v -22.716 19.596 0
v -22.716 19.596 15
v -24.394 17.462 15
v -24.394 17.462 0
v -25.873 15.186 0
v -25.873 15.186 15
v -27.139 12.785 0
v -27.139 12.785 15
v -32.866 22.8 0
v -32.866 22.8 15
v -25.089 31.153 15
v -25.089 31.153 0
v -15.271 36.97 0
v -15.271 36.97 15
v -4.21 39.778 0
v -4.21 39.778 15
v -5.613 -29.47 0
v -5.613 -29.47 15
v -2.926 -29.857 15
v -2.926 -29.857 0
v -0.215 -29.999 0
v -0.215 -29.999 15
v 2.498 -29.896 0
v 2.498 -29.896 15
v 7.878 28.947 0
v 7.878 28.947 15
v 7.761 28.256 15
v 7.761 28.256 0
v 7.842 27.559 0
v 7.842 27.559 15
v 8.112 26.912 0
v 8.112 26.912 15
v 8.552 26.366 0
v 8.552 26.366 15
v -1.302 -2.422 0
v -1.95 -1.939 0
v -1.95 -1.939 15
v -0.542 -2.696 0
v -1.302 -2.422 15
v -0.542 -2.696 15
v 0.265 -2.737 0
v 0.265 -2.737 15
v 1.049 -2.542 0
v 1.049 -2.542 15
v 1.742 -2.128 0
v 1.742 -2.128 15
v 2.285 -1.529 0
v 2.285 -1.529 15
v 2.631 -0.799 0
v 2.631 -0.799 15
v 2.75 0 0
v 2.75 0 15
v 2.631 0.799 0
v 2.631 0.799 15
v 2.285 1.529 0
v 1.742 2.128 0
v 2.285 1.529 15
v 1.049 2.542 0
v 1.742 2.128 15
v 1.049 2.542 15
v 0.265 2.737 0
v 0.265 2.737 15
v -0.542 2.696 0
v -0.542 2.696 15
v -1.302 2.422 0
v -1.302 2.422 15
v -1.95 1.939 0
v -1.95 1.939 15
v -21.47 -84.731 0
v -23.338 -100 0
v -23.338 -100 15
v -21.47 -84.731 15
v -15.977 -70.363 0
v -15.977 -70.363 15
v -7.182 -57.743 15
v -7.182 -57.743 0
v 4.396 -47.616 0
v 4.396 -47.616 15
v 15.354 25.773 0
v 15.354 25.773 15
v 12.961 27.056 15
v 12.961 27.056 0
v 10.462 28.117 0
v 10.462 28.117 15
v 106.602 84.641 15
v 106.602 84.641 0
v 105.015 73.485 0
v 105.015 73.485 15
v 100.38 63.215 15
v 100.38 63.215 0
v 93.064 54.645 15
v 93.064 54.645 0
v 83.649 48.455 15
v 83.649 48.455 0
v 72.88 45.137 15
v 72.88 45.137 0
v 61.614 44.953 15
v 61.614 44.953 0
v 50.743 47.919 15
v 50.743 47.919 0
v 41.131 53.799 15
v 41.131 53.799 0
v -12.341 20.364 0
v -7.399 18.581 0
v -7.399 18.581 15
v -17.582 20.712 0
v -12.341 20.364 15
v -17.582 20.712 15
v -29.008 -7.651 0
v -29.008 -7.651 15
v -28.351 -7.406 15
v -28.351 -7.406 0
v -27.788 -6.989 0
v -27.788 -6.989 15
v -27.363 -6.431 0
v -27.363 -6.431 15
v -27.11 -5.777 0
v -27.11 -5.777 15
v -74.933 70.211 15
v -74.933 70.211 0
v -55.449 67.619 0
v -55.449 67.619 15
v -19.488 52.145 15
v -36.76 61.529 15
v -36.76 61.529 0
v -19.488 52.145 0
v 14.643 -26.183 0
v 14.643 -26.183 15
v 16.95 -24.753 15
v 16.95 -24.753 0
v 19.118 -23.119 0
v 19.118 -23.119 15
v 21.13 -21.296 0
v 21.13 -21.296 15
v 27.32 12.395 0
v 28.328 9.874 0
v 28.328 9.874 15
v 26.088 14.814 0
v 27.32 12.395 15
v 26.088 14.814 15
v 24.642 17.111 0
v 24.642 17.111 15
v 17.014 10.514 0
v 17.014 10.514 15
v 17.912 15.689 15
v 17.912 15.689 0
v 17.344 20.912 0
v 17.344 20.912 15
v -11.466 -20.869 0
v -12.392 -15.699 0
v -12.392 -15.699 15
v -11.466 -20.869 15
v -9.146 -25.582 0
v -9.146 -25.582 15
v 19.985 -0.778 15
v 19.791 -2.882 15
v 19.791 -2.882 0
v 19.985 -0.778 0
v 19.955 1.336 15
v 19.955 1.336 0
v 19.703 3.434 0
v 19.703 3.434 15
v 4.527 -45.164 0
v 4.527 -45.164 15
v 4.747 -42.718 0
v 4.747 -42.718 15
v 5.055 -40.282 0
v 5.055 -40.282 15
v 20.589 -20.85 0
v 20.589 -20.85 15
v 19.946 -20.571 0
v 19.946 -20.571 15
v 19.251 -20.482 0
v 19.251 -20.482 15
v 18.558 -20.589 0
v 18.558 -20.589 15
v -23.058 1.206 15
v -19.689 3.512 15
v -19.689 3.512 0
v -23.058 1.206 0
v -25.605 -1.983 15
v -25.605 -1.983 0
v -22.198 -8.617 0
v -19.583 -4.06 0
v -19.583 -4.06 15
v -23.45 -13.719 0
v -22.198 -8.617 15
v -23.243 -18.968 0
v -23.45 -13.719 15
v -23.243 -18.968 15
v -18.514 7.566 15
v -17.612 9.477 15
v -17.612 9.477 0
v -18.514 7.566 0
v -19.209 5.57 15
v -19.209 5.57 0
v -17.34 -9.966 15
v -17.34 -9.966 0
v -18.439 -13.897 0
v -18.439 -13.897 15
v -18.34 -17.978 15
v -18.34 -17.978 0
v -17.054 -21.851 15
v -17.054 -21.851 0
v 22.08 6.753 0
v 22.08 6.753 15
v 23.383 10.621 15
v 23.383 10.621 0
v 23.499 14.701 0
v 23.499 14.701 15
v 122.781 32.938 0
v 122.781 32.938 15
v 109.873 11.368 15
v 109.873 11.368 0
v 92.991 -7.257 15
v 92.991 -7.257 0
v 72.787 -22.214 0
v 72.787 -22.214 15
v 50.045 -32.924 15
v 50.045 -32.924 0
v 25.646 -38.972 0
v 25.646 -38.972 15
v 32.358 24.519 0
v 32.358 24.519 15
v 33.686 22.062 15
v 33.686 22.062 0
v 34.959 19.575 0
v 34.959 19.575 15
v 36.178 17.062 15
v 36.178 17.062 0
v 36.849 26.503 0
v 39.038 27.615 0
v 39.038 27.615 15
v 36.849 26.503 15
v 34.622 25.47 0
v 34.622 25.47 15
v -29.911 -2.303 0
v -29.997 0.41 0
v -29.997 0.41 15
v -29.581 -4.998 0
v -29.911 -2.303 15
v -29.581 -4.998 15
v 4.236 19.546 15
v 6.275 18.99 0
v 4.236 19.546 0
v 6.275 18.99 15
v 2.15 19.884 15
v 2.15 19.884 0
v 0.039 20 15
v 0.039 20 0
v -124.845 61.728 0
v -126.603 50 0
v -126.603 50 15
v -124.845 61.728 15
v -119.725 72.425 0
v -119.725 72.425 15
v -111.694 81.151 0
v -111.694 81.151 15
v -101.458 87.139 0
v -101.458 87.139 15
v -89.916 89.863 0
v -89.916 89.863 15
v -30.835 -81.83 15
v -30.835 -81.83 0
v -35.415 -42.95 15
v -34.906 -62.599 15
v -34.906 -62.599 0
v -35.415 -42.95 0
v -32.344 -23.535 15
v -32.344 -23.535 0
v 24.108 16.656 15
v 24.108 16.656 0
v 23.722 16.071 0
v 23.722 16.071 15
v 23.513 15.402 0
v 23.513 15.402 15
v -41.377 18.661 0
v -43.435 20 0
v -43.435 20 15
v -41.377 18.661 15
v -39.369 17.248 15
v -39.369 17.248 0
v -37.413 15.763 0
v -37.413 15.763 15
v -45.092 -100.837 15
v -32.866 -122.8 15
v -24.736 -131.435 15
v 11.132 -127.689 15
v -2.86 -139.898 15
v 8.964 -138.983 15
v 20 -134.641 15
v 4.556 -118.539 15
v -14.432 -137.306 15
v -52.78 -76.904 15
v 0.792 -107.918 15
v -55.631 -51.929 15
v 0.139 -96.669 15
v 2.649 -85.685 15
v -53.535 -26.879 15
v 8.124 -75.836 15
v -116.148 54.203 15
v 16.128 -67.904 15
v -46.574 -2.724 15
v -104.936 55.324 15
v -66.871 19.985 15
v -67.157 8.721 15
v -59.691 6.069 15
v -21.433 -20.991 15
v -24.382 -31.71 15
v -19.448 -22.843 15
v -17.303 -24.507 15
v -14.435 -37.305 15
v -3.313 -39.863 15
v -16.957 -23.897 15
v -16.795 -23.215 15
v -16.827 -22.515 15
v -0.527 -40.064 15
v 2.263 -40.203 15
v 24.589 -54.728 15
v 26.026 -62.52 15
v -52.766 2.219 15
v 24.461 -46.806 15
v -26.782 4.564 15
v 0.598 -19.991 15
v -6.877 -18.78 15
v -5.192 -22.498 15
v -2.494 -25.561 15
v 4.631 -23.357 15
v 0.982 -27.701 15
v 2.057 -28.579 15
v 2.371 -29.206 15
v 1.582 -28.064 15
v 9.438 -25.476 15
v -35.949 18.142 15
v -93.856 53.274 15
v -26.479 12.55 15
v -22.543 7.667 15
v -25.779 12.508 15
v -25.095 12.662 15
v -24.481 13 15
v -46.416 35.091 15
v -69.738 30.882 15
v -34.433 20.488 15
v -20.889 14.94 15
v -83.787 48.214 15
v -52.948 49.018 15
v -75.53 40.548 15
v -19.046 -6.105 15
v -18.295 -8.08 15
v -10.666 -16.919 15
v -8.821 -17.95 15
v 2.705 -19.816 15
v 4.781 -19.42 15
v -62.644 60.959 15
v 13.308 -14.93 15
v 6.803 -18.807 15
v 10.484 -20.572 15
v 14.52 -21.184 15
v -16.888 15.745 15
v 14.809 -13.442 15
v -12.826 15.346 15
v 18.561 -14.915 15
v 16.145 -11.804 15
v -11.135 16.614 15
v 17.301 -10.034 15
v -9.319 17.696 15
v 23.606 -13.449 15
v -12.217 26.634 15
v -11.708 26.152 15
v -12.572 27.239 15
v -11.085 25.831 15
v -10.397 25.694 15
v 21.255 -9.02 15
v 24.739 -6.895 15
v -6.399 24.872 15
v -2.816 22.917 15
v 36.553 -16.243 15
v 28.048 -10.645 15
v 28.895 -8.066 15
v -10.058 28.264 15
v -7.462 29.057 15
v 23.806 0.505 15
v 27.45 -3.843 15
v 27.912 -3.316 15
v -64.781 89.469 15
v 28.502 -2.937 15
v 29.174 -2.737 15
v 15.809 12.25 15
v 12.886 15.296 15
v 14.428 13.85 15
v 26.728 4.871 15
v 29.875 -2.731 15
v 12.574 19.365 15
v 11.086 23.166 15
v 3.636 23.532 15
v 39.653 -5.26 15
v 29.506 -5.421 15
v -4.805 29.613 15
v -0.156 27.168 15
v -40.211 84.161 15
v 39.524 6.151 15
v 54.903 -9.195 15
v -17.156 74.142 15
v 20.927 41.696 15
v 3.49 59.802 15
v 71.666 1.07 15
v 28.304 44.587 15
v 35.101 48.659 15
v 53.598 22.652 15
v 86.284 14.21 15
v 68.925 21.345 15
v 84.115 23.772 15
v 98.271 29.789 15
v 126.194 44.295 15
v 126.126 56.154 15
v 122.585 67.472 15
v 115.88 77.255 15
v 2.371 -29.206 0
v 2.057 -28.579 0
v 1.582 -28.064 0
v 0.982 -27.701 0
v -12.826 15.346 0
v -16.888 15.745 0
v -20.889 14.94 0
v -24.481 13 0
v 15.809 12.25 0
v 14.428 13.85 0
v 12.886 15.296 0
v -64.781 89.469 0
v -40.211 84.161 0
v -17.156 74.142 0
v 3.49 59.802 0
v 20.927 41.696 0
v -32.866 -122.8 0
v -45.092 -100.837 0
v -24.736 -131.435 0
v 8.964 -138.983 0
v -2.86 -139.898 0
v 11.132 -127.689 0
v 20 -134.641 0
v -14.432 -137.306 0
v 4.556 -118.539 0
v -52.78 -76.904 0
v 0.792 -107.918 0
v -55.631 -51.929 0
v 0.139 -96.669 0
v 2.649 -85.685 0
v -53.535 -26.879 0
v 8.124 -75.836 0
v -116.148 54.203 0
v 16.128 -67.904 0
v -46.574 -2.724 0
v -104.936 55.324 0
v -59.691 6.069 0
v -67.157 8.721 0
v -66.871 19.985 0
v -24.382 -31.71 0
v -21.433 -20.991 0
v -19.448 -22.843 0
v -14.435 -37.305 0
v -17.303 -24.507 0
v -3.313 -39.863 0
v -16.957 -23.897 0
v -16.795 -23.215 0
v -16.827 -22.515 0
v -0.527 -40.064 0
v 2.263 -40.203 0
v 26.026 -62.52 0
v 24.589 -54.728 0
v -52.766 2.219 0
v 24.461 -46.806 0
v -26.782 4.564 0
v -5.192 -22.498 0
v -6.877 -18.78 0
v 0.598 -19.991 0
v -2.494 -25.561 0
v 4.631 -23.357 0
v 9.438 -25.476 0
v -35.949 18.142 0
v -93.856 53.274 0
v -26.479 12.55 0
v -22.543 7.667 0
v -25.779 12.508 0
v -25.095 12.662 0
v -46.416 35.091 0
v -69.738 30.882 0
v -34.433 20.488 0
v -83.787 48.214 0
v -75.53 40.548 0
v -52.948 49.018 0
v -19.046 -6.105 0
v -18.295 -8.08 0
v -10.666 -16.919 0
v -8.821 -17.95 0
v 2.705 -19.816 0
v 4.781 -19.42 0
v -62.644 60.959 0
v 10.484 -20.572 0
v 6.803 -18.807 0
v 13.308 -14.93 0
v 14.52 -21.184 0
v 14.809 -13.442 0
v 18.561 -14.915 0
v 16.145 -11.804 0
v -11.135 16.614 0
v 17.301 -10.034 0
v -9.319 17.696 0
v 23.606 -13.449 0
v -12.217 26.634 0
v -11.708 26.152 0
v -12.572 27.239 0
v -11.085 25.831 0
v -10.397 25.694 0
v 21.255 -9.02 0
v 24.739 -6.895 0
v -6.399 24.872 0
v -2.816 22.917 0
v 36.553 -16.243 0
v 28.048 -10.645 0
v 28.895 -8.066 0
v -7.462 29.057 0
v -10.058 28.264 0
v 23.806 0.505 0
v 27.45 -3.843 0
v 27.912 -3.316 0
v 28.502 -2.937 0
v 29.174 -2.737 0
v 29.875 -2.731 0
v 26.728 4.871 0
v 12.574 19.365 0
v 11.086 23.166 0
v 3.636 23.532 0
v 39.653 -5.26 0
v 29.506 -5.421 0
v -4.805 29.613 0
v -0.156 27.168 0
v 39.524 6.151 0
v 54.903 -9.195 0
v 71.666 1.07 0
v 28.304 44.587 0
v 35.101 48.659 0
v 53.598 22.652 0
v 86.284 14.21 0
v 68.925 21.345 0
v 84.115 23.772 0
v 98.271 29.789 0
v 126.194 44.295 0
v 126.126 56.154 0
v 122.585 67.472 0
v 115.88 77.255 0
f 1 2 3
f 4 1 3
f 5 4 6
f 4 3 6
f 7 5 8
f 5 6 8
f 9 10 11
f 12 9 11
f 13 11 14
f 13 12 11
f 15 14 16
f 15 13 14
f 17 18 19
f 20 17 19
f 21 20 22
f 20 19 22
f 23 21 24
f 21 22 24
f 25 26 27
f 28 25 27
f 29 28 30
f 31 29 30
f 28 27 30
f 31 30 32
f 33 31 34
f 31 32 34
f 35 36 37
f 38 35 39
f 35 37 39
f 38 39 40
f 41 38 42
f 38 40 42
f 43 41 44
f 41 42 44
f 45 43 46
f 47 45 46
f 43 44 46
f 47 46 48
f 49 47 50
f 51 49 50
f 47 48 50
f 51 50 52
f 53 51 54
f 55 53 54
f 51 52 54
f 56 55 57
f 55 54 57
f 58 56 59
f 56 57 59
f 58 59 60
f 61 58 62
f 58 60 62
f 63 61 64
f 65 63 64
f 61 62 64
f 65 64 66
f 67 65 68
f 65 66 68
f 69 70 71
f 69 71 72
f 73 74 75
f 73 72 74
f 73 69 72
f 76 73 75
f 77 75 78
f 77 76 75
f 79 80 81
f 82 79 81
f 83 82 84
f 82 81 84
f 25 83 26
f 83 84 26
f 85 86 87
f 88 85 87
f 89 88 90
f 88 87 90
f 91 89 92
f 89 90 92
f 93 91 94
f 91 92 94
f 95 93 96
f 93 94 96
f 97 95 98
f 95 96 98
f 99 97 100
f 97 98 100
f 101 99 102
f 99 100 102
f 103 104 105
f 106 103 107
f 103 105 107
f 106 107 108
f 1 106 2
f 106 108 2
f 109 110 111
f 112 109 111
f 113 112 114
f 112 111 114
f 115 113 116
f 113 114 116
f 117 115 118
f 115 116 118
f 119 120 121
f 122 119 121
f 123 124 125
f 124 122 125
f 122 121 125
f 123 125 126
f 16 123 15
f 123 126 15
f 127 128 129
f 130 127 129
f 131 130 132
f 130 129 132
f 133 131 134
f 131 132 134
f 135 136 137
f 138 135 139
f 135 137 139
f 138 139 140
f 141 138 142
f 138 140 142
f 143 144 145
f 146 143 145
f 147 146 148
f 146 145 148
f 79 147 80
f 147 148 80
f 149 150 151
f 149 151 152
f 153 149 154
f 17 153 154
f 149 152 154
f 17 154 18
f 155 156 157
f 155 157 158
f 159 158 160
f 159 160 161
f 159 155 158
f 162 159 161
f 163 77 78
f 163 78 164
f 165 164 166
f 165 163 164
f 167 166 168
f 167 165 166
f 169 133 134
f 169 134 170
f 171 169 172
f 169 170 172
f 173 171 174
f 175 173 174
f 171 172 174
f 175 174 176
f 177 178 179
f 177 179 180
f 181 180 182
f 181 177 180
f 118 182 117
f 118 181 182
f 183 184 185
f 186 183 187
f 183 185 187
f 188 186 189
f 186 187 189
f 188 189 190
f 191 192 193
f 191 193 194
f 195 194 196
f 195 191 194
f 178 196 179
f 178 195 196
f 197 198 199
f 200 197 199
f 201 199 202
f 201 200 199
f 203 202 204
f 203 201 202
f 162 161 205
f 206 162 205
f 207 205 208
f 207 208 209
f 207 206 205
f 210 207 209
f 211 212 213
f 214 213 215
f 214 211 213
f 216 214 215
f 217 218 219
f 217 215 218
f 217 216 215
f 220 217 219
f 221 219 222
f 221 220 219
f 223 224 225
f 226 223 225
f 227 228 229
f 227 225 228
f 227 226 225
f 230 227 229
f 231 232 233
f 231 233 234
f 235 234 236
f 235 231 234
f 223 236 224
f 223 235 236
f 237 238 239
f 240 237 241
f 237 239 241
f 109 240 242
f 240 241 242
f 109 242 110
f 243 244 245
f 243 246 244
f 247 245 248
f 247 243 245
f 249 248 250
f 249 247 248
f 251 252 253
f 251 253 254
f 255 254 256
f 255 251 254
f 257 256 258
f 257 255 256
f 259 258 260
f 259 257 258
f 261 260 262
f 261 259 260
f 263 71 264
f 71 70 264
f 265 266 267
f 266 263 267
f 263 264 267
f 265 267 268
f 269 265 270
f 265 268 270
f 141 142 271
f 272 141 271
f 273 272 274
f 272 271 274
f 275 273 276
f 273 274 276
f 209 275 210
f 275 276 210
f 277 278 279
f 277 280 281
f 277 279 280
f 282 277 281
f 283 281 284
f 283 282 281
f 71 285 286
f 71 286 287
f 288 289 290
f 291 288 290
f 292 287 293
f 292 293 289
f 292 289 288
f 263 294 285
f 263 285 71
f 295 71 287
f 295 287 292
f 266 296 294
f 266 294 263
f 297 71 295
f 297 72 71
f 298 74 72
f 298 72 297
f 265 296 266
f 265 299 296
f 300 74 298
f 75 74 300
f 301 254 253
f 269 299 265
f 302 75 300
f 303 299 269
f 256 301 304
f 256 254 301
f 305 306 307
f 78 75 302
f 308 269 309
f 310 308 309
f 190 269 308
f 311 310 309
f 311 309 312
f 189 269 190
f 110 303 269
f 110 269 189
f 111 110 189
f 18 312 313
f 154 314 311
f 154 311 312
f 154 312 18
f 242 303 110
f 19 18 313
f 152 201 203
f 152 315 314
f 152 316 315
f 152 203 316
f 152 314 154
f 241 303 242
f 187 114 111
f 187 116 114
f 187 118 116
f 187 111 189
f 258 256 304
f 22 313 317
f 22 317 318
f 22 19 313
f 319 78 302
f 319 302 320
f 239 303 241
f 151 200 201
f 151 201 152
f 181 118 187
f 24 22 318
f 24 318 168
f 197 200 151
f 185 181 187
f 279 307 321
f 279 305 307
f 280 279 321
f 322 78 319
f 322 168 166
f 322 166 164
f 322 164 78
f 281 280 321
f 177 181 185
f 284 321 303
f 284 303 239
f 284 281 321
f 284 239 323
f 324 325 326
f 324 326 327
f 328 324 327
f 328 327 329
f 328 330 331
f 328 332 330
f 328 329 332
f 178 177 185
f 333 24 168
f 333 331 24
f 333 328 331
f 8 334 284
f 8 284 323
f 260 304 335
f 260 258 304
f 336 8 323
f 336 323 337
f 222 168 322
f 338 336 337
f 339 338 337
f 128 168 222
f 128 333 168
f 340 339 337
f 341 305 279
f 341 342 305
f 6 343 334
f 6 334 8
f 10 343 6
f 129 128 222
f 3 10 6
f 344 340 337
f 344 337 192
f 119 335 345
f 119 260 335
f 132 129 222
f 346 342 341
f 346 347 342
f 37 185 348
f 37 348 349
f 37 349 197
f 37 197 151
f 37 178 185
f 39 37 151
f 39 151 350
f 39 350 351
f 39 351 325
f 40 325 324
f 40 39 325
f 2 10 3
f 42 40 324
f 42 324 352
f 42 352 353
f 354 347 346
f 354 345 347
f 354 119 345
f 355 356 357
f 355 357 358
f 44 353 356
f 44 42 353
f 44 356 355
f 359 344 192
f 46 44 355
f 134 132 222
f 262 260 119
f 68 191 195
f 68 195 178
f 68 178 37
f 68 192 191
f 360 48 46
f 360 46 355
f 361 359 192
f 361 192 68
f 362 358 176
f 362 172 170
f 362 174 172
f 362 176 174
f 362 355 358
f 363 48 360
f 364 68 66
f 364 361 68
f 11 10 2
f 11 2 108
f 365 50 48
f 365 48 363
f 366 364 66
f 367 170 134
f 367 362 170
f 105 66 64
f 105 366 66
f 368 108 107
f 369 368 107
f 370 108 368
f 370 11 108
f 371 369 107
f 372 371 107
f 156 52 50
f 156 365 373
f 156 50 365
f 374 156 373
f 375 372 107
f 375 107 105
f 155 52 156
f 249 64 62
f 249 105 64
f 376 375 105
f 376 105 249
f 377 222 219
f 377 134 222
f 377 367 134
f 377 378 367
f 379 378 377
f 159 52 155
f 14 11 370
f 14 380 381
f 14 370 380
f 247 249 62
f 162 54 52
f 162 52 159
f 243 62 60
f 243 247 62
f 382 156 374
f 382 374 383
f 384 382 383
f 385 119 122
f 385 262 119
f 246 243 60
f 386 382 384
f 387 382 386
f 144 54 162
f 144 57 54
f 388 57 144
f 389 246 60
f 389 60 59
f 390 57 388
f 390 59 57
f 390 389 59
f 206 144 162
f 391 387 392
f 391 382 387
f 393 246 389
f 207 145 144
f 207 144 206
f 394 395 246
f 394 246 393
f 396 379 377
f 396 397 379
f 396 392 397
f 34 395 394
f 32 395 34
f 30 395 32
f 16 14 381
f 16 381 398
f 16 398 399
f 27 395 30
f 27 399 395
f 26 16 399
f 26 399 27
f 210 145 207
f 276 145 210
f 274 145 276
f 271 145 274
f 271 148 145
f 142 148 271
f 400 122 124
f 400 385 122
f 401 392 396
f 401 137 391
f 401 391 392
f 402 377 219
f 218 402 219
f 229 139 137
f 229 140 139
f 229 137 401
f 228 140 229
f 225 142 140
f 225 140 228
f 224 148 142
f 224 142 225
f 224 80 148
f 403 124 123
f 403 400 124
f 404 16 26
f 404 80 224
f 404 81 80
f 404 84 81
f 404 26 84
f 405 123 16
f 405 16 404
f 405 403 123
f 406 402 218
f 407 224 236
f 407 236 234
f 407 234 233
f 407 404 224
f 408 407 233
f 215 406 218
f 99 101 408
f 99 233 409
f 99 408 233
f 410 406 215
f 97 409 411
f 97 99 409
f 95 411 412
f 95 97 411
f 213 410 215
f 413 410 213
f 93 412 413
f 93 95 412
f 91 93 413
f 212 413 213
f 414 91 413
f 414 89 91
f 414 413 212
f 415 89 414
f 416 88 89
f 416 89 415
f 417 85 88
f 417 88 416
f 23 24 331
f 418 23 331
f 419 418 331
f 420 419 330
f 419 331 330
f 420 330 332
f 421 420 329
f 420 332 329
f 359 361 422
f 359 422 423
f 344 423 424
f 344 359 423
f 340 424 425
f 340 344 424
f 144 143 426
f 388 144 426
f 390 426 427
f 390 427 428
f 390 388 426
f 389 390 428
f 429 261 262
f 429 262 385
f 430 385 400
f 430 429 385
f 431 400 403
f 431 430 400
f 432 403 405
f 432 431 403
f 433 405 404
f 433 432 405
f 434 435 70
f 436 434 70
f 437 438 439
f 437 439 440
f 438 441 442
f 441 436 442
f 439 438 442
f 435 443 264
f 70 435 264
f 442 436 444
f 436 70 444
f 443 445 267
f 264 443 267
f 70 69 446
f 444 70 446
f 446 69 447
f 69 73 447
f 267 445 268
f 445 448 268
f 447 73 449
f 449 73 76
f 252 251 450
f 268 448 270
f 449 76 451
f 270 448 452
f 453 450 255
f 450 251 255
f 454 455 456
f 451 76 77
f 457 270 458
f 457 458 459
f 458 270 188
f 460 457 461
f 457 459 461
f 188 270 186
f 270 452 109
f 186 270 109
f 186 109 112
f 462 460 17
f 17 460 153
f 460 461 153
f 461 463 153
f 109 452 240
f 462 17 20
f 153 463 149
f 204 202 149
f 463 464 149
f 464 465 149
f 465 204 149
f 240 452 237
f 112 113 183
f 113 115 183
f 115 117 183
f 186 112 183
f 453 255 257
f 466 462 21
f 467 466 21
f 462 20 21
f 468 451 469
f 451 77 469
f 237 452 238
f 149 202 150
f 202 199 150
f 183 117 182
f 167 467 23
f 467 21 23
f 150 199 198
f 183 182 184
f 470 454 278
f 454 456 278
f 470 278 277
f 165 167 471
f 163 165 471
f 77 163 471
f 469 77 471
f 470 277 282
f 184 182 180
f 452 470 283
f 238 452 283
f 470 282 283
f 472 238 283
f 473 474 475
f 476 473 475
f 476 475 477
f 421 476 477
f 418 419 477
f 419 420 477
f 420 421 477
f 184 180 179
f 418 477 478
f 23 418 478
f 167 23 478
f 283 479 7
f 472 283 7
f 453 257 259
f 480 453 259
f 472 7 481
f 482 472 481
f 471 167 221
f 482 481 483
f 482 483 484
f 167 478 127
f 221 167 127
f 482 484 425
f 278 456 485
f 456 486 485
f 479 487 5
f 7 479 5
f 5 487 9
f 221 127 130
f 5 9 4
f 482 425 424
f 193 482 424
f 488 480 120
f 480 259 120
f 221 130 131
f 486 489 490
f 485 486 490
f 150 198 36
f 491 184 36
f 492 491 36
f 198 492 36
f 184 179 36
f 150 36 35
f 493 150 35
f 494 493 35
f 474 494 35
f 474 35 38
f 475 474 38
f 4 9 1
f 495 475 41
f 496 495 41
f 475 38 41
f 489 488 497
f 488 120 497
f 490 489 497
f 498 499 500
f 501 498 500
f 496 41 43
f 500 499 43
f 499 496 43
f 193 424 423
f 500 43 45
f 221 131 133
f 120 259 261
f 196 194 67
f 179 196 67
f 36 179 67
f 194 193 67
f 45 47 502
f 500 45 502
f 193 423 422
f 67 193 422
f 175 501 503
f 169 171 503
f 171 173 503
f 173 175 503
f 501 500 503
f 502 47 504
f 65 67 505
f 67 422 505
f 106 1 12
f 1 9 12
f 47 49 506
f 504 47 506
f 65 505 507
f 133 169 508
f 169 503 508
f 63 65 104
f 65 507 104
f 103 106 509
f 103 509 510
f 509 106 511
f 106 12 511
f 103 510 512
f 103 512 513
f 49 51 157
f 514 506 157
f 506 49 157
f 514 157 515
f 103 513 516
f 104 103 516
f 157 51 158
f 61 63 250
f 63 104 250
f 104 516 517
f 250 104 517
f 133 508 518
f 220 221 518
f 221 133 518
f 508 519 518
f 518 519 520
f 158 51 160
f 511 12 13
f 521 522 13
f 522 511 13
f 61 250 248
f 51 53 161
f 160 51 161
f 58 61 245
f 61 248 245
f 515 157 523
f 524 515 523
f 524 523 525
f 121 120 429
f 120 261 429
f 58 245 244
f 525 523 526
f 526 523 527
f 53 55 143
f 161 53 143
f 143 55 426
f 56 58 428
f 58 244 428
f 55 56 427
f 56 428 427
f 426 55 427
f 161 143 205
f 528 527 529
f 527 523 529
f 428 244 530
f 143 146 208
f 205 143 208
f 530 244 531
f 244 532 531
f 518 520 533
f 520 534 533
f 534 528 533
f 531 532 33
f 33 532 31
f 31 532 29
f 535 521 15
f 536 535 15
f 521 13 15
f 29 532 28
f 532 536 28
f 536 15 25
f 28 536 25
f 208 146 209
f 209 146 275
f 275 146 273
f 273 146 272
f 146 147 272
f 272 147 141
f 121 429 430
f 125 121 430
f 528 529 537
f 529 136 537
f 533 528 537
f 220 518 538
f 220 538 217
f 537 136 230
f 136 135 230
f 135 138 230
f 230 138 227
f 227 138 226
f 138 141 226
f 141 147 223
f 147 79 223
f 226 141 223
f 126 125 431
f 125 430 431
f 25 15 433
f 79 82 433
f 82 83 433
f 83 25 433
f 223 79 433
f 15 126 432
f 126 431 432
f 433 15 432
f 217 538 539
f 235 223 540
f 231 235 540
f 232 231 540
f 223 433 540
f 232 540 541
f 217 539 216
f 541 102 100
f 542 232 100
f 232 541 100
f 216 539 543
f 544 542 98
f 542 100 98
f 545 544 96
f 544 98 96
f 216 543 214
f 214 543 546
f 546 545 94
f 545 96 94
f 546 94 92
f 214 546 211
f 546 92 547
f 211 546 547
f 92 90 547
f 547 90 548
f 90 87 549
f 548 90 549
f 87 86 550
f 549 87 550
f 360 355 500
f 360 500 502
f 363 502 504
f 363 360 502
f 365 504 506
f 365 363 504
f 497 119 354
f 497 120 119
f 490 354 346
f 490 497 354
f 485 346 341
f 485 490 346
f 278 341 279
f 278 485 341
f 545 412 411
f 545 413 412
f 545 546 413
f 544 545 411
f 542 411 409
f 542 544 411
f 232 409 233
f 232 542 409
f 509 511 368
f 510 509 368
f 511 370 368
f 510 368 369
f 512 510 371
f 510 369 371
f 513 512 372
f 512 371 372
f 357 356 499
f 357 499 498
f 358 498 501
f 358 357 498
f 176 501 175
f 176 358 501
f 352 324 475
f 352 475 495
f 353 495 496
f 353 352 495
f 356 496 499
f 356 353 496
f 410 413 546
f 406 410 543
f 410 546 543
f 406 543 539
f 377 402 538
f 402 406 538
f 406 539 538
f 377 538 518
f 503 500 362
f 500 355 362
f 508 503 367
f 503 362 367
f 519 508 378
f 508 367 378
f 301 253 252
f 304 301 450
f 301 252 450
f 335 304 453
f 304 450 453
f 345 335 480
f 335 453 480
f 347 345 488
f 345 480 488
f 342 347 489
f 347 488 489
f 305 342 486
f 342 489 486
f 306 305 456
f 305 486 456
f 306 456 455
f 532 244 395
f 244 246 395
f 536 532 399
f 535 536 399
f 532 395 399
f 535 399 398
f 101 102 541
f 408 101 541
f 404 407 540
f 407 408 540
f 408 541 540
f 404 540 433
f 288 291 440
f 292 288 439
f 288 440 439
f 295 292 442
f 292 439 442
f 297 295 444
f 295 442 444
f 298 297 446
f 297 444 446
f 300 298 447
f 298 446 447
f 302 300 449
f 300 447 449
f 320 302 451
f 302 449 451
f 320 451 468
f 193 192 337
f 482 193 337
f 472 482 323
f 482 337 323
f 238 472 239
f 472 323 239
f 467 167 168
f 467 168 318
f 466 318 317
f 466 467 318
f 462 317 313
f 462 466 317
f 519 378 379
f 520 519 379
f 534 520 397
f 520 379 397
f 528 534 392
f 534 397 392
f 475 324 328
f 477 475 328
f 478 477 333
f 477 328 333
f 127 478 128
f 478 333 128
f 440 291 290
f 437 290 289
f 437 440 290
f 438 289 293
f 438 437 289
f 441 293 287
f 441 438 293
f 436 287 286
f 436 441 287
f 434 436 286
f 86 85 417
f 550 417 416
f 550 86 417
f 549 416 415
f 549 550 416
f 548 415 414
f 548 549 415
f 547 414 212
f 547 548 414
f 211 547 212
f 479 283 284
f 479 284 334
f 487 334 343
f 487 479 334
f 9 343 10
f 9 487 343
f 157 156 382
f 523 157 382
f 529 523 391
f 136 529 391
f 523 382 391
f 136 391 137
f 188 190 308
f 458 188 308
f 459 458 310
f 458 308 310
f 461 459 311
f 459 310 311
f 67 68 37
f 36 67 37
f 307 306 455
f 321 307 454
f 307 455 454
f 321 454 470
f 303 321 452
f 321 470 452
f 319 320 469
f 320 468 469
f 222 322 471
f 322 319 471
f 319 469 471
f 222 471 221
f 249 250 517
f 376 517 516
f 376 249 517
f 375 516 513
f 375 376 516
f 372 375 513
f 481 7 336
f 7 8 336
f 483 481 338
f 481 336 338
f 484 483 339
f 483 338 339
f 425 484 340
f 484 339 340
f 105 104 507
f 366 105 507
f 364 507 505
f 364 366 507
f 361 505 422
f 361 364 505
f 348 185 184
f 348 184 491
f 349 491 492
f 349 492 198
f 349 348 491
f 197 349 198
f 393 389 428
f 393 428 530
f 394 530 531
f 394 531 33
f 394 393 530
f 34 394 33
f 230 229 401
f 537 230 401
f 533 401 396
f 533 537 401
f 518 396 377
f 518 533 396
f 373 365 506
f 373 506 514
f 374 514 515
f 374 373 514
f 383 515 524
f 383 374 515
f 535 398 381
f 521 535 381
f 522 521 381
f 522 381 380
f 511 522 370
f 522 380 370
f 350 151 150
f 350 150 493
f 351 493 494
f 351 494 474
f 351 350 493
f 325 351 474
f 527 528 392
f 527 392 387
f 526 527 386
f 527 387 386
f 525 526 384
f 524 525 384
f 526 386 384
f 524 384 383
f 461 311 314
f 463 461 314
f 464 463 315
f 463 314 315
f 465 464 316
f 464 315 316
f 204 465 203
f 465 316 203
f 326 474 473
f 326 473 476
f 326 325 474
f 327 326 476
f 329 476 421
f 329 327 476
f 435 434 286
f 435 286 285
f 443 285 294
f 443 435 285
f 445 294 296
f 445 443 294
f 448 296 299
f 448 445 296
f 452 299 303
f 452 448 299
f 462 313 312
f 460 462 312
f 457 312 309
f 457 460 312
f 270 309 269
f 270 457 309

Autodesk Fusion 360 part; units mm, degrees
sketch "스케치1" plane through (0, 0, 0) normal (0, 0, 1) x (1, 0, 0)
  arc A0 (32.8655, -22.8005) -> (32.8655, -77.1995) centre (72.0719, -50) ccw
  arc A1 (32.8655, -22.8005) -> (-32.8655, 22.8005) centre (0, 0) ccw
  arc A2 (-32.8655, 22.8005) -> (-32.8655, -122.8005) centre (72.0719, -50) ccw
  arc A3 (-32.8655, -122.8005) -> (32.8655, -77.1995) centre (0, -100) ccw
  arc A4 (0, 0) -> (0, -100) centre (72.0719, -50) ccw construction
  arc A5 (16.4327, -11.4002) -> (16.4327, -88.5998) centre (72.0719, -50) ccw
  arc A6 (16.4327, -11.4002) -> (-16.4327, 11.4002) centre (0, 0) ccw
  arc A7 (-16.4327, 11.4002) -> (-16.4327, -111.4002) centre (72.0719, -50) ccw
  arc A8 (-16.4327, -111.4002) -> (16.4327, -88.5998) centre (0, -100) ccw
  arc A9 (0, 0) -> (0, -100) centre (72.0719, -50) ccw construction
  circle A10 centre (40, -100) radius 40
  circle A11 centre (40, -100) radius 63.3381
  arc A12 (1.6565, 19.9313) -> (-1.6565, -19.9313) centre (0, 0) ccw
  arc A13 (0, 0) -> (86.6025, 50) centre (7.2653, 87.4161) ccw construction
  arc A14 (3.3131, 39.8626) -> (50.424, 67.0621) centre (7.2653, 87.4161) ccw
  arc A15 (3.3131, 39.8626) -> (-3.3131, -39.8626) centre (0, 0) ccw
  arc A16 (104.6918, 41.469) -> (68.5133, 58.531) centre (86.6025, 50) ccw
  arc A17 (122.7811, 32.9379) -> (50.424, 67.0621) centre (86.6025, 50) ccw
  arc A18 (1.6565, 19.9313) -> (68.5133, 58.531) centre (7.2653, 87.4161) ccw
  arc A19 (-1.6565, -19.9313) -> (104.6918, 41.469) centre (7.2653, 87.4161) ccw
  circle A20 centre (66.6025, 84.641) radius 63.3381
  arc A21 (0, 0) -> (86.6025, 50) centre (7.2653, 87.4161) ccw construction
  arc A22 (-3.3131, -39.8626) -> (122.7811, 32.9379) centre (7.2653, 87.4161) ccw
  circle A23 centre (66.6025, 84.641) radius 40
  arc A24 (-18.0893, -8.531) -> (18.0893, 8.531) centre (0, 0) ccw
  arc A25 (0, 0) -> (-86.6025, 50) centre (-79.3372, -37.4161) ccw construction
  arc A26 (-36.1785, -17.0621) -> (-83.2895, 10.1374) centre (-79.3372, -37.4161) ccw
  arc A27 (-36.1785, -17.0621) -> (36.1785, 17.0621) centre (0, 0) ccw
  arc A28 (-88.2591, 69.9313) -> (-84.946, 30.0687) centre (-86.6025, 50) ccw
  arc A29 (-89.9156, 89.8626) -> (-83.2895, 10.1374) centre (-86.6025, 50) ccw
  arc A30 (-18.0893, -8.531) -> (-84.946, 30.0687) centre (-79.3372, -37.4161) ccw
  arc A31 (18.0893, 8.531) -> (-88.2591, 69.9313) centre (-79.3372, -37.4161) ccw
  circle A32 centre (-106.6025, 15.359) radius 63.3381
  arc A33 (0, 0) -> (-86.6025, 50) centre (-79.3372, -37.4161) ccw construction
  arc A34 (36.1785, 17.0621) -> (-89.9156, 89.8626) centre (-79.3372, -37.4161) ccw
  circle A35 centre (-106.6025, 15.359) radius 40
  dimension "d1" = 100
  dimension "d2" = 80
  dimension "d3" = 40
  dimension "d5" = 360
extrude "돌출1" add sketch "스케치1" along normal blind 30 contours A0 A1 A11 A17 A19 A20 A22 A27 | A1 A5 A19 A27 | A0 A5 A11 A22 A27 | A0 A11 A22 | A0 A11 A22 | A1 A5 A6 A18 A19 A24 A27 A31 | A5 A7 A12 A15 A19 A24 A27 A30 | A5 A22 A27 | A0 A5 A10 A11 A22 | A5 A11 A22 | A1 A18 A34 | A5 A19 A24 | A16 A18 A19 A20 A23 | A16 A17 A19 A20 A23 | A5 A7 A8 A10 A11 | A1 A15 A18 A31 | A1 A14 A18 A20 A34 | A18 A20 A34 | A6 A12 A24 | A14 A18 A20 A23 A34 | A7 A15 A27 A30 | A2 A3 A7 A11 A15 A26 A27 A32 | A3 A7 A8 A10 A11 | A1 A14 A15 A20 A29 A31 A32 A34 | A6 A18 A31 | A1 A6 A7 A12 A15 A18 A30 A31 | A14 A20 A34 | A7 A12 A30 | A2 A15 A26 A30 A32 | A14 A20 A34 | A2 A15 A30 | A2 A26 A32 | A2 A26 A32 | A28 A30 A31 A32 A35 | A28 A29 A31 A32 A35 | A2 A30 A32 | A2 A26 A30 A32 A35
sketch "스케치2" plane through (0, 0, 30) normal (0, 0, 1) x (-1, 0, 0)
  arc A0 (-36.5535, 16.2433) -> (-98.2716, -29.7887) centre (-7.2653, -87.4161) ccw
  arc A1 (-36.5535, 16.2433) -> (-36.1785, -17.0621) centre (0, 0) ccw
  arc A2 (-36.1785, -17.0621) -> (-32.3578, -24.5192) centre (79.3372, 37.4161) ccw
  arc A3 (-32.3578, -24.5192) -> (-39.0384, -27.6153) centre (-7.2653, -87.4161) ccw
  arc A4 (-39.0384, -27.6153) -> (-98.2716, -29.7887) centre (-66.6025, -84.641) ccw
  arc A5 (32.3438, 23.5346) -> (3.3131, 39.8626) centre (0, 0) ccw
  arc A6 (3.3131, 39.8626) -> (-5.0553, 40.2823) centre (-7.2653, -87.4161) ccw
  arc A7 (-5.0553, 40.2823) -> (-4.3964, 47.6159) centre (-72.0719, 50) ccw
  arc A8 (-4.3964, 47.6159) -> (23.3381, 100) centre (-40, 100) ccw
  arc A9 (32.3438, 23.5346) -> (23.3381, 100) centre (-72.0719, 50) ccw
  arc A10 (4.2097, -39.7779) -> (74.9335, -70.2113) centre (79.3372, 37.4161) ccw
  arc A11 (4.2097, -39.7779) -> (32.8655, -22.8005) centre (0, 0) ccw
  arc A12 (32.8655, -22.8005) -> (37.4131, -15.7631) centre (-72.0719, 50) ccw
  arc A13 (37.4131, -15.7631) -> (43.4348, -20.0006) centre (79.3372, 37.4161) ccw
  arc A14 (43.4348, -20.0006) -> (74.9335, -70.2113) centre (106.6025, -15.359) ccw
  arc A15 (46.5737, 2.7244) -> (32.8655, 122.8005) centre (-72.0719, 50) ccw
  arc A16 (32.8655, 122.8005) -> (-20, 134.641) centre (0, 100) ccw
  arc A17 (-26.0262, 62.5202) -> (-20, 134.641) centre (-40, 100) ccw
  arc A18 (-25.6463, 38.9718) -> (-26.0262, 62.5202) centre (-72.0719, 50) ccw
  arc A19 (-25.6463, 38.9718) -> (-122.7811, -32.9379) centre (-7.2653, -87.4161) ccw
  arc A20 (-122.7811, -32.9379) -> (-106.6025, -84.641) centre (-86.6025, -50) ccw
  arc A21 (-41.131, -53.7995) -> (-106.6025, -84.641) centre (-66.6025, -84.641) ccw
  arc A22 (-20.9274, -41.6962) -> (-41.131, -53.7995) centre (-7.2653, -87.4161) ccw
  arc A23 (-20.9274, -41.6962) -> (89.9156, -89.8626) centre (79.3372, 37.4161) ccw
  arc A24 (89.9156, -89.8626) -> (126.6025, -50) centre (86.6025, -50) ccw
  arc A25 (67.1572, -8.7207) -> (126.6025, -50) centre (106.6025, -15.359) ccw
  arc A26 (46.5737, 2.7244) -> (67.1572, -8.7207) centre (79.3372, 37.4161) ccw
  circle A27 centre (0, 0) radius 30
  circle A28 centre (0, 0) radius 20
  arc A29 (0.9818, -2.2991) -> (0.9818, 32.2991) centre (-6.4058, 15) ccw
  arc A30 (-0.9818, 2.2991) -> (0.9818, -2.2991) centre (0, 0) ccw
  arc A31 (-0.9818, 2.2991) -> (-0.9818, 27.7009) centre (-6.4058, 15) ccw
  arc A32 (0.9818, 32.2991) -> (-0.9818, 27.7009) centre (0, 30) ccw
  arc A33 (0, 0) -> (0, 30) centre (-6.4058, 15) ccw construction
  arc A34 (-2.23, 1.1301) -> (-18.5579, 20.589) centre (-14.5489, 7.3731) ccw
  arc A35 (2.23, -1.1301) -> (-20.0093, 25.3737) centre (-14.5489, 7.3731) ccw
  arc A36 (-20.0093, 25.3737) -> (-18.5579, 20.589) centre (-19.2836, 22.9813) ccw
  arc A37 (-2.23, 1.1301) -> (2.23, -1.1301) centre (0, 0) ccw
  arc A38 (-2.4347, -0.5677) -> (-27.4505, 3.8433) centre (-15.8845, -3.7037) ccw
  arc A39 (2.4347, 0.5677) -> (-31.6379, 6.5756) centre (-15.8845, -3.7037) ccw
  arc A40 (-31.6379, 6.5756) -> (-27.4505, 3.8433) centre (-29.5442, 5.2094) ccw
  arc A41 (-2.4347, -0.5677) -> (2.4347, 0.5677) centre (0, 0) ccw
  arc A42 (-1.5002, -1.9999) -> (-23.4987, -14.7007) centre (-9.7875, -13.0476) ccw
  arc A43 (1.5002, 1.9999) -> (-28.4628, -15.2993) centre (-9.7875, -13.0476) ccw
  arc A44 (-28.4628, -15.2993) -> (-23.4987, -14.7007) centre (-25.9808, -15) ccw
  arc A45 (-1.5002, -1.9999) -> (1.5002, 1.9999) centre (0, 0) ccw
  arc A46 (0.1363, -2.4963) -> (-8.5516, -26.3661) centre (0.8892, -16.2863) ccw
  arc A47 (-0.1363, 2.4963) -> (-11.9696, -30.0154) centre (0.8892, -16.2863) ccw
  arc A48 (-11.9696, -30.0154) -> (-8.5516, -26.3661) centre (-10.2606, -28.1908) ccw
  arc A49 (0.1363, -2.4963) -> (-0.1363, 2.4963) centre (0, 0) ccw
  arc A50 (1.709, -1.8247) -> (10.3969, -25.6945) centre (11.1498, -11.9045) ccw
  arc A51 (-1.709, 1.8247) -> (10.1243, -30.6871) centre (11.1498, -11.9045) ccw
  arc A52 (10.1243, -30.6871) -> (10.3969, -25.6945) centre (10.2606, -28.1908) ccw
  arc A53 (1.709, -1.8247) -> (-1.709, 1.8247) centre (0, 0) ccw
  arc A54 (2.482, -0.2993) -> (24.4806, -13.0001) centre (16.1933, -1.9524) ccw
  arc A55 (-2.482, 0.2993) -> (27.4809, -16.9999) centre (16.1933, -1.9524) ccw
  arc A56 (27.4809, -16.9999) -> (24.4806, -13.0001) centre (25.9808, -15) ccw
  arc A57 (2.482, -0.2993) -> (-2.482, 0.2993) centre (0, 0) ccw
  arc A58 (2.0937, 1.3662) -> (27.1095, 5.7771) centre (13.6598, 8.9132) ccw
  arc A59 (-2.0937, -1.3662) -> (31.9789, 4.6418) centre (13.6598, 8.9132) ccw
  arc A60 (31.9789, 4.6418) -> (27.1095, 5.7771) centre (29.5442, 5.2094) ccw
  arc A61 (2.0937, 1.3662) -> (-2.0937, -1.3662) centre (0, 0) ccw
  arc A62 (0.7257, 2.3924) -> (17.0536, 21.8512) centre (4.7347, 15.6082) ccw
  arc A63 (-0.7257, -2.3924) -> (21.5136, 24.1114) centre (4.7347, 15.6082) ccw
  arc A64 (21.5136, 24.1114) -> (17.0536, 21.8512) centre (19.2836, 22.9813) ccw
  arc A65 (0.7257, 2.3924) -> (-0.7257, -2.3924) centre (0, 0) ccw
  dimension "d8" = 60
  dimension "d9" = 40
  dimension "d10" = 5
  dimension "d12" = 360
extrude "돌출2" cut sketch "스케치2" against normal blind 30 contours A27 A28 A58 A59 A60 | A27 A28 A62 A63 A64 | A27 A28 A54 A55 A56 | A27 A28 A29 A31 A32 | A27 A28 A50 A51 A52 | A27 A28 A34 A35 A36 | A27 A28 A46 A47 A48 | A27 A28 A38 A39 A40 | A27 A28 A42 A43 A44
sketch "스케치3" plane through (0, 0, 30) normal (0, 0, 1) x (-1, 0, 0)
  arc A0 (4.805, -29.6127) -> (12.5722, -27.2386) centre (0, 0) ccw
  arc A1 (-6.2753, -18.99) -> (4.805, -29.6127) centre (11.1498, -11.9045) ccw
  arc A2 (-6.2753, -18.99) -> (-0.0393, -20) centre (0, 0) ccw
  arc A3 (-0.0393, -20) -> (10.3969, -25.6945) centre (11.1498, -11.9045) ccw
  arc A4 (12.5722, -27.2386) -> (10.3969, -25.6945) centre (10.2606, -28.1908) ccw
  arc A5 (5.6129, 29.4702) -> (-2.4978, 29.8958) centre (0, 0) ccw
  arc A6 (12.3918, 15.6985) -> (5.6129, 29.4702) centre (-6.4058, 15) ccw
  arc A7 (12.3918, 15.6985) -> (6.8773, 18.7804) centre (0, 0) ccw
  arc A8 (6.8773, 18.7804) -> (-0.9818, 27.7009) centre (-6.4058, 15) ccw
  arc A9 (-2.4978, 29.8958) -> (-0.9818, 27.7009) centre (0, 30) ccw
  arc A10 (-14.6434, 26.1834) -> (-21.1301, 21.296) centre (0, 0) ccw
  arc A11 (-0.5981, 19.9911) -> (-14.6434, 26.1834) centre (-14.5489, 7.3731) ccw
  arc A12 (-0.5981, 19.9911) -> (-6.8035, 18.8072) centre (0, 0) ccw
  arc A13 (-6.8035, 18.8072) -> (-18.5579, 20.589) centre (-14.5489, 7.3731) ccw
  arc A14 (-21.1301, 21.296) -> (-18.5579, 20.589) centre (-19.2836, 22.9813) ccw
  arc A15 (22.7155, -19.596) -> (27.1395, -12.7847) centre (0, 0) ccw
  arc A16 (7.3994, -18.5809) -> (22.7155, -19.596) centre (16.1933, -1.9524) ccw
  arc A17 (7.3994, -18.5809) -> (12.8256, -15.3461) centre (0, 0) ccw
  arc A18 (12.8256, -15.3461) -> (24.4806, -13.0001) centre (16.1933, -1.9524) ccw
  arc A19 (27.1395, -12.7847) -> (24.4806, -13.0001) centre (25.9808, -15) ccw
  arc A20 (-15.3538, -25.7732) -> (-7.8778, -28.9472) centre (0, 0) ccw
  arc A21 (-17.0137, -10.5135) -> (-15.3538, -25.7732) centre (0.8892, -16.2863) ccw
  arc A22 (-17.0137, -10.5135) -> (-12.8858, -15.2956) centre (0, 0) ccw
  arc A23 (-12.8858, -15.2956) -> (-8.5516, -26.3661) centre (0.8892, -16.2863) ccw
  arc A24 (-7.8778, -28.9472) -> (-8.5516, -26.3661) centre (-10.2606, -28.1908) ccw
  arc A25 (23.2428, 18.9676) -> (17.3032, 24.5071) centre (0, 0) ccw
  arc A26 (19.5835, 4.0605) -> (23.2428, 18.9676) centre (4.7347, 15.6082) ccw
  arc A27 (19.5835, 4.0605) -> (17.3401, 9.966) centre (0, 0) ccw
  arc A28 (17.3401, 9.966) -> (17.0536, 21.8512) centre (4.7347, 15.6082) ccw
  arc A29 (17.3032, 24.5071) -> (17.0536, 21.8512) centre (19.2836, 22.9813) ccw
  arc A30 (-28.0479, 10.6451) -> (-29.8754, 2.7315) centre (0, 0) ccw
  arc A31 (-13.3082, 14.9296) -> (-28.0479, 10.6451) centre (-15.8845, -3.7037) ccw
  arc A32 (-13.3082, 14.9296) -> (-17.3008, 10.034) centre (0, 0) ccw
  arc A33 (-17.3008, 10.034) -> (-27.4505, 3.8433) centre (-15.8845, -3.7037) ccw
  arc A34 (-29.8754, 2.7315) -> (-27.4505, 3.8433) centre (-29.5442, 5.2094) ccw
  arc A35 (29.9972, -0.4102) -> (29.0079, 7.6512) centre (0, 0) ccw
  arc A36 (17.6118, -9.4775) -> (29.9972, -0.4102) centre (13.6598, 8.9132) ccw
  arc A37 (17.6118, -9.4775) -> (19.6893, -3.5116) centre (0, 0) ccw
  arc A38 (19.6893, -3.5116) -> (27.1095, 5.7771) centre (13.6598, 8.9132) ccw
  arc A39 (29.0079, 7.6512) -> (27.1095, 5.7771) centre (29.5442, 5.2094) ccw
  arc A40 (-28.3284, -9.8742) -> (-24.6416, -17.1111) centre (0, 0) ccw
  arc A41 (-19.7912, 2.8823) -> (-28.3284, -9.8742) centre (-9.7875, -13.0476) ccw
  arc A42 (-19.7912, 2.8823) -> (-19.7029, -3.4343) centre (0, 0) ccw
  arc A43 (-19.7029, -3.4343) -> (-23.4987, -14.7007) centre (-9.7875, -13.0476) ccw
  arc A44 (-24.6416, -17.1111) -> (-23.4987, -14.7007) centre (-25.9808, -15) ccw
  arc A45 (-36.5535, 16.2433) -> (-98.2716, -29.7887) centre (-7.2653, -87.4161) ccw
  arc A46 (-36.5535, 16.2433) -> (-36.1785, -17.0621) centre (0, 0) ccw
  arc A47 (-36.1785, -17.0621) -> (-32.3578, -24.5192) centre (79.3372, 37.4161) ccw
  arc A48 (-32.3578, -24.5192) -> (-39.0384, -27.6153) centre (-7.2653, -87.4161) ccw
  arc A49 (-39.0384, -27.6153) -> (-98.2716, -29.7887) centre (-66.6025, -84.641) ccw
  arc A50 (32.3438, 23.5346) -> (3.3131, 39.8626) centre (0, 0) ccw
  arc A51 (3.3131, 39.8626) -> (-5.0553, 40.2823) centre (-7.2653, -87.4161) ccw
  arc A52 (-5.0553, 40.2823) -> (-4.3964, 47.6159) centre (-72.0719, 50) ccw
  arc A53 (-4.3964, 47.6159) -> (23.3381, 100) centre (-40, 100) ccw
  arc A54 (32.3438, 23.5346) -> (23.3381, 100) centre (-72.0719, 50) ccw
  arc A55 (4.2097, -39.7779) -> (74.9335, -70.2113) centre (79.3372, 37.4161) ccw
  arc A56 (4.2097, -39.7779) -> (32.8655, -22.8005) centre (0, 0) ccw
  arc A57 (32.8655, -22.8005) -> (37.4131, -15.7631) centre (-72.0719, 50) ccw
  arc A58 (37.4131, -15.7631) -> (43.4348, -20.0006) centre (79.3372, 37.4161) ccw
  arc A59 (43.4348, -20.0006) -> (74.9335, -70.2113) centre (106.6025, -15.359) ccw
  arc A60 (46.5737, 2.7244) -> (32.8655, 122.8005) centre (-72.0719, 50) ccw
  arc A61 (32.8655, 122.8005) -> (-20, 134.641) centre (0, 100) ccw
  arc A62 (-26.0262, 62.5202) -> (-20, 134.641) centre (-40, 100) ccw
  arc A63 (-25.6463, 38.9718) -> (-26.0262, 62.5202) centre (-72.0719, 50) ccw
  arc A64 (-25.6463, 38.9718) -> (-122.7811, -32.9379) centre (-7.2653, -87.4161) ccw
  arc A65 (-122.7811, -32.9379) -> (-106.6025, -84.641) centre (-86.6025, -50) ccw
  arc A66 (-41.131, -53.7995) -> (-106.6025, -84.641) centre (-66.6025, -84.641) ccw
  arc A67 (-20.9274, -41.6962) -> (-41.131, -53.7995) centre (-7.2653, -87.4161) ccw
  arc A68 (-20.9274, -41.6962) -> (89.9156, -89.8626) centre (79.3372, 37.4161) ccw
  arc A69 (89.9156, -89.8626) -> (126.6025, -50) centre (86.6025, -50) ccw
  arc A70 (67.1572, -8.7207) -> (126.6025, -50) centre (106.6025, -15.359) ccw
  arc A71 (46.5737, 2.7244) -> (67.1572, -8.7207) centre (79.3372, 37.4161) ccw
  circle A72 centre (0, 0) radius 2.75
  line L0 (-2.75, 0) -> (1.95, 0)
  line L1 (1.95, 0) -> (1.95, -1.9391)
  line L2 (1.95, 0) -> (1.95, 1.9391)
  dimension "d15" = 5.5
  dimension "d16" = 4.7
extrude "돌출3" cut sketch "스케치3" against normal blind 30 contours A72 L0 L2 | A72 L0 L1
extrude "돌출4" cut 1 faces at (-16.7209, -113.5942, 30) along direction (0, 0, -1) blind 15
